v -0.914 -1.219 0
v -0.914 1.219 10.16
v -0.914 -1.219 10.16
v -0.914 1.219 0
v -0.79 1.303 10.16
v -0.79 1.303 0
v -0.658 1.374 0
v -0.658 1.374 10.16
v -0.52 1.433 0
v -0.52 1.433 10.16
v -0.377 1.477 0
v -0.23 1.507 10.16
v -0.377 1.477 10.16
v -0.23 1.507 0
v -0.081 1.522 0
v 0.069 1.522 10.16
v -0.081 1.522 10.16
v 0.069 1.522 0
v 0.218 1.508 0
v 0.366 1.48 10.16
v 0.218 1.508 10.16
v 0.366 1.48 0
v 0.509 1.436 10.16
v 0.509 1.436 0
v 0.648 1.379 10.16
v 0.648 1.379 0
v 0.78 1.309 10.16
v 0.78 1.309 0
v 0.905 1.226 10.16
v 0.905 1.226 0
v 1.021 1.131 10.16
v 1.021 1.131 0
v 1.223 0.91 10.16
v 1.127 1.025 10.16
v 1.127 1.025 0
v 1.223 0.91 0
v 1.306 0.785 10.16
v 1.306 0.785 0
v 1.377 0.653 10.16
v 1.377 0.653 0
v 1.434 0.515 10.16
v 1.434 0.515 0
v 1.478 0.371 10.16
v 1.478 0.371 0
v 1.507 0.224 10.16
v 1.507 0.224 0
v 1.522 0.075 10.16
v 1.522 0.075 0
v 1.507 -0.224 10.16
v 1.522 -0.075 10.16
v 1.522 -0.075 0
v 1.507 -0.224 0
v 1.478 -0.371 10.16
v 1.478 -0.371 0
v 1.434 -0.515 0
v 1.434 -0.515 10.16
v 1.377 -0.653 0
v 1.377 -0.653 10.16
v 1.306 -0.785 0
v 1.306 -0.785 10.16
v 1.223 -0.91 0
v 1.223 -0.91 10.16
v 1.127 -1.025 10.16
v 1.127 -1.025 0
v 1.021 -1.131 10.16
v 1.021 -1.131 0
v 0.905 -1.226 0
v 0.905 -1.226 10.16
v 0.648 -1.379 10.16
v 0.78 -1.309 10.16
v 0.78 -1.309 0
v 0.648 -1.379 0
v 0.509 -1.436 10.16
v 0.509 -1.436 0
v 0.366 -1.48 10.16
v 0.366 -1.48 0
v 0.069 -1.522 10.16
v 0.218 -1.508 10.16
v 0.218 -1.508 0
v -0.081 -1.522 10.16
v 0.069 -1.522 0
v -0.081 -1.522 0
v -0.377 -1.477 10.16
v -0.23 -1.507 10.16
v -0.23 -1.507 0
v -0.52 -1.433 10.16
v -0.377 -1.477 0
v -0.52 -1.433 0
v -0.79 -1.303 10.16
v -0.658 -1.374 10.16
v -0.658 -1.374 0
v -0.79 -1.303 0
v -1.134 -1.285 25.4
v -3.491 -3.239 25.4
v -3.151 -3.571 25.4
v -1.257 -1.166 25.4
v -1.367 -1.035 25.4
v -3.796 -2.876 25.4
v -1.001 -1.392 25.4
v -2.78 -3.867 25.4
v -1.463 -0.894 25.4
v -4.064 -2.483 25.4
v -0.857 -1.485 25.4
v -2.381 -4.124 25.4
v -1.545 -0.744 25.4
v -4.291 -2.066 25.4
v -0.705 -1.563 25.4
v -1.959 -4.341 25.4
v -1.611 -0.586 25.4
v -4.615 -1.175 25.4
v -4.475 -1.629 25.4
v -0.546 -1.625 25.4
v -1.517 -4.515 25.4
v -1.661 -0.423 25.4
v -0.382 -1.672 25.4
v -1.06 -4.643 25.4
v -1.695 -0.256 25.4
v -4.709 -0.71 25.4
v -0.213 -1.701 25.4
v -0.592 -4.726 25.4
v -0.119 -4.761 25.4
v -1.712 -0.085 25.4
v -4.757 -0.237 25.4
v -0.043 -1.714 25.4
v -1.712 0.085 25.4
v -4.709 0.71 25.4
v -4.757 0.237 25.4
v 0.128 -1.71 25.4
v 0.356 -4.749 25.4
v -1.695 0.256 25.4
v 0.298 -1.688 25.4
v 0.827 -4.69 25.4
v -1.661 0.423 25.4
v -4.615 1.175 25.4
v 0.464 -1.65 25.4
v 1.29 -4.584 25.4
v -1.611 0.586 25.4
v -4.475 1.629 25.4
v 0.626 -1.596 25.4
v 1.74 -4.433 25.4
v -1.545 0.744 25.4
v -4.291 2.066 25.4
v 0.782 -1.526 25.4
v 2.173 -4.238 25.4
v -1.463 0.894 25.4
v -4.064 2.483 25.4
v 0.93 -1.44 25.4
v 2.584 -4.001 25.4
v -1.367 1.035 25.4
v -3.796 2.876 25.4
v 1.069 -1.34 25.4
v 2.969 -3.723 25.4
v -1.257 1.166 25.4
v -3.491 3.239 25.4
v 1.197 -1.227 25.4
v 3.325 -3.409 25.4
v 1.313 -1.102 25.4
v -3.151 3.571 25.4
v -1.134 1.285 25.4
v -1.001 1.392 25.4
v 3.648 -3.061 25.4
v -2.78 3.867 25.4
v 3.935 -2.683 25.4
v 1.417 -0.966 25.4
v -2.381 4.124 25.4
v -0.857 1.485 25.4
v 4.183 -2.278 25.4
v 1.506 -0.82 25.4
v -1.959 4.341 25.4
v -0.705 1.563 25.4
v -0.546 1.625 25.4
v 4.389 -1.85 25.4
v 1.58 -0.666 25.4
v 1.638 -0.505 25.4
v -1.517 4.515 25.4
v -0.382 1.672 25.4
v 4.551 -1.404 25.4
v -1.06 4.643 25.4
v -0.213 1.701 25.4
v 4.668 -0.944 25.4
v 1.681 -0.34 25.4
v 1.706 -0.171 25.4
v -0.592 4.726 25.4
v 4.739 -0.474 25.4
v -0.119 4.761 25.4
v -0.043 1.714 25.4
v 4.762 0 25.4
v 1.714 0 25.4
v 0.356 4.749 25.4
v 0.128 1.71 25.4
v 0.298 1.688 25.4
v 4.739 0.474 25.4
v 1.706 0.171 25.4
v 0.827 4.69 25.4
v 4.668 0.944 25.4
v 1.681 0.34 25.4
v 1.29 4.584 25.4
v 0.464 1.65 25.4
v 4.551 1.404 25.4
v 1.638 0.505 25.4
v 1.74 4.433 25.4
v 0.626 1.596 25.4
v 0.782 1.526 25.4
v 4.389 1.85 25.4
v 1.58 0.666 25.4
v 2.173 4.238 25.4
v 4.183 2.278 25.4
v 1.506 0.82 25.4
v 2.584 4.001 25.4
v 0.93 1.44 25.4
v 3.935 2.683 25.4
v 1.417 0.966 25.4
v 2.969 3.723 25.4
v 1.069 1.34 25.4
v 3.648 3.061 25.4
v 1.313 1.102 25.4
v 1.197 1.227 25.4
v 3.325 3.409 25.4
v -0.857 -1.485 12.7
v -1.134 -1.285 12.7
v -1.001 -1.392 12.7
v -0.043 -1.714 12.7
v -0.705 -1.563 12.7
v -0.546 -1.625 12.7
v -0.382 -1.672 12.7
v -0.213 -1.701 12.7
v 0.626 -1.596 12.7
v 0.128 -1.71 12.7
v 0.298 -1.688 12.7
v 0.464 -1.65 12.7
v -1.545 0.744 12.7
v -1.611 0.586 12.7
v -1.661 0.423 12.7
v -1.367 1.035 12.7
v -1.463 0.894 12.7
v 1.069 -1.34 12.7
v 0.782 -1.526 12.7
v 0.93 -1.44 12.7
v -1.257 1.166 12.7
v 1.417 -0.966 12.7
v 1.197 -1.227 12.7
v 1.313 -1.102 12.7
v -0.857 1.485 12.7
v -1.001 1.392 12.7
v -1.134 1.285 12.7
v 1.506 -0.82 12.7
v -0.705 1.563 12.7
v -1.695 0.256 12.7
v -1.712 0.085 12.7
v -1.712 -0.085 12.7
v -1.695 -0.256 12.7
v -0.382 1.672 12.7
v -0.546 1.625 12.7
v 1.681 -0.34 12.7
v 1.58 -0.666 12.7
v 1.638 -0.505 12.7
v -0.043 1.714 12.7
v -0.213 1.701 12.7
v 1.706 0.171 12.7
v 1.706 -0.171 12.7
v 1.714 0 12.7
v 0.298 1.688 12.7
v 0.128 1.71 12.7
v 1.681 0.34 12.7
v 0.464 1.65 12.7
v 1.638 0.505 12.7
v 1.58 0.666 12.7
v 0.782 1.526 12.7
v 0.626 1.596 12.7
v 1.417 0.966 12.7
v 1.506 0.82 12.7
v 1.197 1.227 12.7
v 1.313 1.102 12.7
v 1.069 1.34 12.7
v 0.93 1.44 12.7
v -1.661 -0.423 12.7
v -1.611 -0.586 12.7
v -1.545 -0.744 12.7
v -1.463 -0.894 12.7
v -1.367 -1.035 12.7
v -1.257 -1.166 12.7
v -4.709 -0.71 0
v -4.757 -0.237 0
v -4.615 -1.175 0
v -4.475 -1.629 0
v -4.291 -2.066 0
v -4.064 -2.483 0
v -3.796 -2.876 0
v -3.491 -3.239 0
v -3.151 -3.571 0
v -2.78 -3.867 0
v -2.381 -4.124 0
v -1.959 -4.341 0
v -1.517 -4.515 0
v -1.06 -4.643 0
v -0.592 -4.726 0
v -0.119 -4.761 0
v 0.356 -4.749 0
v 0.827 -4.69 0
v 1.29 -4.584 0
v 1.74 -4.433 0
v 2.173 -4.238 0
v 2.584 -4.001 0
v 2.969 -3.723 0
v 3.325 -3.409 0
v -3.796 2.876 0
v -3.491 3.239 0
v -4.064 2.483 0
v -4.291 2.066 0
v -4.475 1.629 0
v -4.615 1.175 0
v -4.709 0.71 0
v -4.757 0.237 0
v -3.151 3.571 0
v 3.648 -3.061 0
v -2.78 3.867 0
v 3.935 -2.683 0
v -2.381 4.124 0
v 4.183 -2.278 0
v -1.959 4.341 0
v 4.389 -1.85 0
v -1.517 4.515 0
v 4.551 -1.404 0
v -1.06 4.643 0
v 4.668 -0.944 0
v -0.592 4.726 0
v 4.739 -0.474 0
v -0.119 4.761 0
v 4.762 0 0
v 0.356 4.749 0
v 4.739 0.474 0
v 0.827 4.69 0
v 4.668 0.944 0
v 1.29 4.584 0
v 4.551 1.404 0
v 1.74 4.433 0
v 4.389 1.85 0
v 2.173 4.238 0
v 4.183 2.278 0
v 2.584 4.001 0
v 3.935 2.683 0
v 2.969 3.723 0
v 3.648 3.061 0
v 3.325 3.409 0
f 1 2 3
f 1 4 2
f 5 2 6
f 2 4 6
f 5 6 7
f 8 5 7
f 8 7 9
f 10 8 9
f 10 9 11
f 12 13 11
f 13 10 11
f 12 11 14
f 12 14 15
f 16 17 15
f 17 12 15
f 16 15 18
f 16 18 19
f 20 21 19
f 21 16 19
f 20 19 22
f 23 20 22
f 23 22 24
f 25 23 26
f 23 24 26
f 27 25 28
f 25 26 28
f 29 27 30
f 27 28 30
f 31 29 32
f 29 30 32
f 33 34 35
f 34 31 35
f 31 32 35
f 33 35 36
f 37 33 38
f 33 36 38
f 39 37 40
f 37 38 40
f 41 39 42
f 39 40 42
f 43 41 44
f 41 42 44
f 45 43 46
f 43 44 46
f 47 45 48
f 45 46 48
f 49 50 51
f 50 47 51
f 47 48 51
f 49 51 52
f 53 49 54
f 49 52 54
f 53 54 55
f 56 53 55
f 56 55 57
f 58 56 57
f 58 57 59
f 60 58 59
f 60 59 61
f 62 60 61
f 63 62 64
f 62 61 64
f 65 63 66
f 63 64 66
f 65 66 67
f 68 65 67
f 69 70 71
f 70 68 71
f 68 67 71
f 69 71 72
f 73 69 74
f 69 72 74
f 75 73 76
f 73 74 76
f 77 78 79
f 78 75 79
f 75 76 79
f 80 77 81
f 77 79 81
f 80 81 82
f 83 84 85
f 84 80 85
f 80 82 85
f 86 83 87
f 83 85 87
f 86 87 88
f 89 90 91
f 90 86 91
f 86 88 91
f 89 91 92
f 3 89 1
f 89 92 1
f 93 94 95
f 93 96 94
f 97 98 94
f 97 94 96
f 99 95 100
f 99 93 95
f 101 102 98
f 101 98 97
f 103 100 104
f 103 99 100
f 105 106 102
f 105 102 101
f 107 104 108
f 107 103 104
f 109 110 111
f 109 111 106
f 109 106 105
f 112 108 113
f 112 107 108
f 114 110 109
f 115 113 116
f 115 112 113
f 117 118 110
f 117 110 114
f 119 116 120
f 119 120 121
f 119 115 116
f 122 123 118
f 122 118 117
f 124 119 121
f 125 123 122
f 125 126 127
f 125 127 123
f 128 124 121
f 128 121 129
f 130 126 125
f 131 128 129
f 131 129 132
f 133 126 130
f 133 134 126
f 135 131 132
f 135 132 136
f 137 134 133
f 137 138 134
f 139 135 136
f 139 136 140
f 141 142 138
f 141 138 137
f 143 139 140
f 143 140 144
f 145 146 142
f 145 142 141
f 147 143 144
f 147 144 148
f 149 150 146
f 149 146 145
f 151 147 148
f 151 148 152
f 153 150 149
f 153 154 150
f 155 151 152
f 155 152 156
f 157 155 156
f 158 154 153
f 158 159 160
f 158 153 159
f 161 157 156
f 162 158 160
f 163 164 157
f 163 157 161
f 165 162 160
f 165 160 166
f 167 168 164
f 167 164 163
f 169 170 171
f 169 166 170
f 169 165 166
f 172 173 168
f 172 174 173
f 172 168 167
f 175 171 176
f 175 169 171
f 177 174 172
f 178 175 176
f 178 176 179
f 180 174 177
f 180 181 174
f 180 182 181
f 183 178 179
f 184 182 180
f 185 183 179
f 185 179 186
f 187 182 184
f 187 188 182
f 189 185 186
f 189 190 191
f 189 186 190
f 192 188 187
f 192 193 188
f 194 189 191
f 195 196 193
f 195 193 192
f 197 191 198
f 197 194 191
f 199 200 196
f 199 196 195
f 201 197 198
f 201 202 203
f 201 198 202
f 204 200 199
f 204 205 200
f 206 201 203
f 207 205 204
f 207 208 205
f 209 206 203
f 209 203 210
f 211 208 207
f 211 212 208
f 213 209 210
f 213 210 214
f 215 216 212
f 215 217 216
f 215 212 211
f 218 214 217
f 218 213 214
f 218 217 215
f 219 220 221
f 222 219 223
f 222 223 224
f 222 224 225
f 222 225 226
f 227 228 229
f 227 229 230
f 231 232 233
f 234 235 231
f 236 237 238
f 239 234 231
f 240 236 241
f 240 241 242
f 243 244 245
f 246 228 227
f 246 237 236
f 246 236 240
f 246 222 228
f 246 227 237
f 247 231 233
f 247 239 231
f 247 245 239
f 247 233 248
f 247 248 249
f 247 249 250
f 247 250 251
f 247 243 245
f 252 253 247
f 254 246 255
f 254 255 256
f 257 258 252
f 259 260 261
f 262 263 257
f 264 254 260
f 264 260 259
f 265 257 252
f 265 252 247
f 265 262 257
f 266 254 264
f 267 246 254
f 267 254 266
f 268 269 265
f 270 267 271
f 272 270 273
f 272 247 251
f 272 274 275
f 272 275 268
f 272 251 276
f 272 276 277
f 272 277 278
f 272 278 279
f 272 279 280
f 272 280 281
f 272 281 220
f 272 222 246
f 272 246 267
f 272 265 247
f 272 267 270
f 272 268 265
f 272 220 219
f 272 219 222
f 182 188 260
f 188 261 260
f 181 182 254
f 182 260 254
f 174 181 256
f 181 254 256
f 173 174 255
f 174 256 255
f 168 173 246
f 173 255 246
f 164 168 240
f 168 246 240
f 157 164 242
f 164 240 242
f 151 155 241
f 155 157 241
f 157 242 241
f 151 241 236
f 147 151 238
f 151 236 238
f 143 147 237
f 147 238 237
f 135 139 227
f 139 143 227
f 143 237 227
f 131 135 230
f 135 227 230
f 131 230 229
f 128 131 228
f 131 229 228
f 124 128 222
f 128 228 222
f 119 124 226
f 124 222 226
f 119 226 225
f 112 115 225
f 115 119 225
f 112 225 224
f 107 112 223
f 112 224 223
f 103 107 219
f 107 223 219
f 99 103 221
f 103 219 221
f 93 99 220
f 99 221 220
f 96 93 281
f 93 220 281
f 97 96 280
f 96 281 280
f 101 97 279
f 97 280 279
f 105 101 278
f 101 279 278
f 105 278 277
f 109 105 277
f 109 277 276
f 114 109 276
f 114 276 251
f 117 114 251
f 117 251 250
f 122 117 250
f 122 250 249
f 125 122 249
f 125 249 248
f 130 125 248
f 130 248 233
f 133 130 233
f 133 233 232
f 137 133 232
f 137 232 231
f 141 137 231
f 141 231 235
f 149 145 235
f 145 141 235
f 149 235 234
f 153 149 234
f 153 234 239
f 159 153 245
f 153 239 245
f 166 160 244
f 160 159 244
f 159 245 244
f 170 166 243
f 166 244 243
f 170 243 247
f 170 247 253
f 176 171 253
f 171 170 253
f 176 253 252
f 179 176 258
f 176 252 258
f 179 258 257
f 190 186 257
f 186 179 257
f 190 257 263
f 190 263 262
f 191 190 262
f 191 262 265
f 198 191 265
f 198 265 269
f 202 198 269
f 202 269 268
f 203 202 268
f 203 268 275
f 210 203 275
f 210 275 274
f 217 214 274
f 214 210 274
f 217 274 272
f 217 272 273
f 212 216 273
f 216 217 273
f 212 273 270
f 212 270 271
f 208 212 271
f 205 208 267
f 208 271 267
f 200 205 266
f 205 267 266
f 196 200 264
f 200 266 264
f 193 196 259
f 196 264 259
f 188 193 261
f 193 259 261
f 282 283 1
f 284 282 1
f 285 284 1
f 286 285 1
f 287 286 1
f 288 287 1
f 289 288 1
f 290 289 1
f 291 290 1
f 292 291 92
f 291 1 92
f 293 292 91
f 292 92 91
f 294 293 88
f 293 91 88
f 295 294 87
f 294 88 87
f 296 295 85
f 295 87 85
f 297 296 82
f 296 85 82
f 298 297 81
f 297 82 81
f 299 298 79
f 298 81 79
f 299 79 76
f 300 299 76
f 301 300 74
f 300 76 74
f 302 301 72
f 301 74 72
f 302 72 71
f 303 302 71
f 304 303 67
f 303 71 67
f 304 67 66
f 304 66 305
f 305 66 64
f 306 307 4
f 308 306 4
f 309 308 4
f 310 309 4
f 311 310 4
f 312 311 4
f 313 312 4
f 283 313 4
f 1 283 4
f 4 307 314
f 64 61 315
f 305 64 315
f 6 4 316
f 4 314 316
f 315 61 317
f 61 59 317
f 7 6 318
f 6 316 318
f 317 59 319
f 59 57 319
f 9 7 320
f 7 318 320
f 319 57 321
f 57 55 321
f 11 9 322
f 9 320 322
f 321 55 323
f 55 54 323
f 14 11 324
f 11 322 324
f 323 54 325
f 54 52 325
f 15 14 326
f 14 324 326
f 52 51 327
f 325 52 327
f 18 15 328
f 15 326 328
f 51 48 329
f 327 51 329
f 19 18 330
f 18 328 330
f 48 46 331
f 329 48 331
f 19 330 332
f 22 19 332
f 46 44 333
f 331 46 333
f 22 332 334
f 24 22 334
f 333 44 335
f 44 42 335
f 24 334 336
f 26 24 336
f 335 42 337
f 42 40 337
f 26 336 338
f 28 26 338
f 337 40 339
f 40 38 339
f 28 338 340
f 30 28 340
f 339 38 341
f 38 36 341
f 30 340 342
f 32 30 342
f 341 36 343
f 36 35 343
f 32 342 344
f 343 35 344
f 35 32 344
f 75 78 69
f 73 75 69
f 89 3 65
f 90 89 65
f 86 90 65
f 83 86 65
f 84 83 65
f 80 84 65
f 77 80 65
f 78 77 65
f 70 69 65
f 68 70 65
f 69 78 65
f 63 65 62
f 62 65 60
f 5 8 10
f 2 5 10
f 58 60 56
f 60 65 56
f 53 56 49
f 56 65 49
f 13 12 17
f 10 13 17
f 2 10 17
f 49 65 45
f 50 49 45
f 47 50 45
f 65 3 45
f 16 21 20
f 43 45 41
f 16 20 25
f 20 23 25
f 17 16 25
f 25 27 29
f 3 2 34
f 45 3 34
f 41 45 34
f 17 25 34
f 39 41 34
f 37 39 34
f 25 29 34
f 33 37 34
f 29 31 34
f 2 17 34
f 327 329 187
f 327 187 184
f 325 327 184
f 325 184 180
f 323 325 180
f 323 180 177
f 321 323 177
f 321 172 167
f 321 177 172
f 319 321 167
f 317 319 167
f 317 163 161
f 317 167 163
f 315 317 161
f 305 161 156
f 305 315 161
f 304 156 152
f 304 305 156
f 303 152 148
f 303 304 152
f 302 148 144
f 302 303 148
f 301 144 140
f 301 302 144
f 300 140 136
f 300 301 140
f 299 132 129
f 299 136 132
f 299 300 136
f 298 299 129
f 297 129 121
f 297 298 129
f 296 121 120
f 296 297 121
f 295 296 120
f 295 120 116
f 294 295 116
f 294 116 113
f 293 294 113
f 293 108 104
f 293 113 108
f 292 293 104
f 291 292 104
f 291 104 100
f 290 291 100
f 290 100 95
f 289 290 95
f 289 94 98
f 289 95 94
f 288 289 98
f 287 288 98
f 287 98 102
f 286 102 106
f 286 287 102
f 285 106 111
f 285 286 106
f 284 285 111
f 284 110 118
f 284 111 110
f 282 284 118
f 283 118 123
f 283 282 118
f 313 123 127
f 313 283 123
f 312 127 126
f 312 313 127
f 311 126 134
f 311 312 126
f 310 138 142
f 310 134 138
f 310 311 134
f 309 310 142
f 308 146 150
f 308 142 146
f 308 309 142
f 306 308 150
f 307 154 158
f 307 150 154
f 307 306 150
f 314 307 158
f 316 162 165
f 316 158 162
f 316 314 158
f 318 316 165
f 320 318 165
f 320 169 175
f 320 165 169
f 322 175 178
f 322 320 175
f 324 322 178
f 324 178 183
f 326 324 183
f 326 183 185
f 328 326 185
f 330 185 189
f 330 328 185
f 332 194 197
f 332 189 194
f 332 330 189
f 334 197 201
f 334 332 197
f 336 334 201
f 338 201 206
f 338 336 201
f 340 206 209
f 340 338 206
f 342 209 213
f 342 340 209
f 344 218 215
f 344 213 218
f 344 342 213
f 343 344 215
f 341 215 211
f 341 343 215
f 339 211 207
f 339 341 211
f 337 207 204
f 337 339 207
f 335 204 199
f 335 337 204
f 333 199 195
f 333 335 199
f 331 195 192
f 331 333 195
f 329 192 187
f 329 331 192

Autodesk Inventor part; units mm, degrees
ref_plane "YZ Plane" through (0, 0, 0) normal (1, 0, 0) x (0, 1, 0)
ref_plane "XZ Plane" through (0, 0, 0) normal (0, 1, 0) x (-1, 0, 0)
ref_plane "XY Plane" through (0, 0, 0) normal (0, 0, 1) x (1, 0, 0)
sketch "Sketch1" plane through (0, 0, 0) normal (0, 0, 1) x (1, 0, 0)
  arc A0 (-0.9144, -1.2192) -> (-0.9144, 1.2192) centre (0, 0) ccw
  line L0 (-0.9144, 1.2192) -> (-0.9144, -1.2192)
  circle A1 centre (0, 0) radius 4.7625
  point P0 (-0.889, 0)
  point P1 (1.524, 0)
  dimension "d0" = 3.048
  dimension "d2" = 2.413
  dimension "d3" = 9.525
extrude "Extrusion1" add sketch "Sketch1" along normal blind 10.16
sketch "Sketch2" plane through (0, 0, 10.16) normal (0, 0, 1) x (1, 0, 0)
  circle A0 centre (0, 0) radius 4.7625 projected
extrude "Extrusion2" add sketch "Sketch2" along normal blind 6.35
sketch "Sketch3" plane through (0, 0, 16.51) normal (0, 0, 1) x (1, 0, 0)
  circle A0 centre (0, 0) radius 4.7625 projected
  circle A1 centre (0, 0) radius 1.7145
  dimension "d8" = 3.429
extrude "Extrusion3" add sketch "Sketch3" along normal blind 12.7
sketch "Sketch4" plane through (0, 0, 29.21) normal (0, 0, 1) x (1, 0, 0)
  circle A0 centre (0, 0) radius 1.7145 projected
  circle A1 centre (0, 0) radius 4.7625 projected
extrude "Extrusion4" cut sketch "Sketch4" against normal blind 3.81
sketch "Sketch5" plane through (0, 0, 16.51) normal (0, 0, 1) x (1, 0, 0)
  circle A0 centre (0, 0) radius 1.7145 projected
extrude "Extrusion5" cut sketch "Sketch5" against normal blind 3.81
properties part number "Coupling Bushing" material "ABS Plastic"
